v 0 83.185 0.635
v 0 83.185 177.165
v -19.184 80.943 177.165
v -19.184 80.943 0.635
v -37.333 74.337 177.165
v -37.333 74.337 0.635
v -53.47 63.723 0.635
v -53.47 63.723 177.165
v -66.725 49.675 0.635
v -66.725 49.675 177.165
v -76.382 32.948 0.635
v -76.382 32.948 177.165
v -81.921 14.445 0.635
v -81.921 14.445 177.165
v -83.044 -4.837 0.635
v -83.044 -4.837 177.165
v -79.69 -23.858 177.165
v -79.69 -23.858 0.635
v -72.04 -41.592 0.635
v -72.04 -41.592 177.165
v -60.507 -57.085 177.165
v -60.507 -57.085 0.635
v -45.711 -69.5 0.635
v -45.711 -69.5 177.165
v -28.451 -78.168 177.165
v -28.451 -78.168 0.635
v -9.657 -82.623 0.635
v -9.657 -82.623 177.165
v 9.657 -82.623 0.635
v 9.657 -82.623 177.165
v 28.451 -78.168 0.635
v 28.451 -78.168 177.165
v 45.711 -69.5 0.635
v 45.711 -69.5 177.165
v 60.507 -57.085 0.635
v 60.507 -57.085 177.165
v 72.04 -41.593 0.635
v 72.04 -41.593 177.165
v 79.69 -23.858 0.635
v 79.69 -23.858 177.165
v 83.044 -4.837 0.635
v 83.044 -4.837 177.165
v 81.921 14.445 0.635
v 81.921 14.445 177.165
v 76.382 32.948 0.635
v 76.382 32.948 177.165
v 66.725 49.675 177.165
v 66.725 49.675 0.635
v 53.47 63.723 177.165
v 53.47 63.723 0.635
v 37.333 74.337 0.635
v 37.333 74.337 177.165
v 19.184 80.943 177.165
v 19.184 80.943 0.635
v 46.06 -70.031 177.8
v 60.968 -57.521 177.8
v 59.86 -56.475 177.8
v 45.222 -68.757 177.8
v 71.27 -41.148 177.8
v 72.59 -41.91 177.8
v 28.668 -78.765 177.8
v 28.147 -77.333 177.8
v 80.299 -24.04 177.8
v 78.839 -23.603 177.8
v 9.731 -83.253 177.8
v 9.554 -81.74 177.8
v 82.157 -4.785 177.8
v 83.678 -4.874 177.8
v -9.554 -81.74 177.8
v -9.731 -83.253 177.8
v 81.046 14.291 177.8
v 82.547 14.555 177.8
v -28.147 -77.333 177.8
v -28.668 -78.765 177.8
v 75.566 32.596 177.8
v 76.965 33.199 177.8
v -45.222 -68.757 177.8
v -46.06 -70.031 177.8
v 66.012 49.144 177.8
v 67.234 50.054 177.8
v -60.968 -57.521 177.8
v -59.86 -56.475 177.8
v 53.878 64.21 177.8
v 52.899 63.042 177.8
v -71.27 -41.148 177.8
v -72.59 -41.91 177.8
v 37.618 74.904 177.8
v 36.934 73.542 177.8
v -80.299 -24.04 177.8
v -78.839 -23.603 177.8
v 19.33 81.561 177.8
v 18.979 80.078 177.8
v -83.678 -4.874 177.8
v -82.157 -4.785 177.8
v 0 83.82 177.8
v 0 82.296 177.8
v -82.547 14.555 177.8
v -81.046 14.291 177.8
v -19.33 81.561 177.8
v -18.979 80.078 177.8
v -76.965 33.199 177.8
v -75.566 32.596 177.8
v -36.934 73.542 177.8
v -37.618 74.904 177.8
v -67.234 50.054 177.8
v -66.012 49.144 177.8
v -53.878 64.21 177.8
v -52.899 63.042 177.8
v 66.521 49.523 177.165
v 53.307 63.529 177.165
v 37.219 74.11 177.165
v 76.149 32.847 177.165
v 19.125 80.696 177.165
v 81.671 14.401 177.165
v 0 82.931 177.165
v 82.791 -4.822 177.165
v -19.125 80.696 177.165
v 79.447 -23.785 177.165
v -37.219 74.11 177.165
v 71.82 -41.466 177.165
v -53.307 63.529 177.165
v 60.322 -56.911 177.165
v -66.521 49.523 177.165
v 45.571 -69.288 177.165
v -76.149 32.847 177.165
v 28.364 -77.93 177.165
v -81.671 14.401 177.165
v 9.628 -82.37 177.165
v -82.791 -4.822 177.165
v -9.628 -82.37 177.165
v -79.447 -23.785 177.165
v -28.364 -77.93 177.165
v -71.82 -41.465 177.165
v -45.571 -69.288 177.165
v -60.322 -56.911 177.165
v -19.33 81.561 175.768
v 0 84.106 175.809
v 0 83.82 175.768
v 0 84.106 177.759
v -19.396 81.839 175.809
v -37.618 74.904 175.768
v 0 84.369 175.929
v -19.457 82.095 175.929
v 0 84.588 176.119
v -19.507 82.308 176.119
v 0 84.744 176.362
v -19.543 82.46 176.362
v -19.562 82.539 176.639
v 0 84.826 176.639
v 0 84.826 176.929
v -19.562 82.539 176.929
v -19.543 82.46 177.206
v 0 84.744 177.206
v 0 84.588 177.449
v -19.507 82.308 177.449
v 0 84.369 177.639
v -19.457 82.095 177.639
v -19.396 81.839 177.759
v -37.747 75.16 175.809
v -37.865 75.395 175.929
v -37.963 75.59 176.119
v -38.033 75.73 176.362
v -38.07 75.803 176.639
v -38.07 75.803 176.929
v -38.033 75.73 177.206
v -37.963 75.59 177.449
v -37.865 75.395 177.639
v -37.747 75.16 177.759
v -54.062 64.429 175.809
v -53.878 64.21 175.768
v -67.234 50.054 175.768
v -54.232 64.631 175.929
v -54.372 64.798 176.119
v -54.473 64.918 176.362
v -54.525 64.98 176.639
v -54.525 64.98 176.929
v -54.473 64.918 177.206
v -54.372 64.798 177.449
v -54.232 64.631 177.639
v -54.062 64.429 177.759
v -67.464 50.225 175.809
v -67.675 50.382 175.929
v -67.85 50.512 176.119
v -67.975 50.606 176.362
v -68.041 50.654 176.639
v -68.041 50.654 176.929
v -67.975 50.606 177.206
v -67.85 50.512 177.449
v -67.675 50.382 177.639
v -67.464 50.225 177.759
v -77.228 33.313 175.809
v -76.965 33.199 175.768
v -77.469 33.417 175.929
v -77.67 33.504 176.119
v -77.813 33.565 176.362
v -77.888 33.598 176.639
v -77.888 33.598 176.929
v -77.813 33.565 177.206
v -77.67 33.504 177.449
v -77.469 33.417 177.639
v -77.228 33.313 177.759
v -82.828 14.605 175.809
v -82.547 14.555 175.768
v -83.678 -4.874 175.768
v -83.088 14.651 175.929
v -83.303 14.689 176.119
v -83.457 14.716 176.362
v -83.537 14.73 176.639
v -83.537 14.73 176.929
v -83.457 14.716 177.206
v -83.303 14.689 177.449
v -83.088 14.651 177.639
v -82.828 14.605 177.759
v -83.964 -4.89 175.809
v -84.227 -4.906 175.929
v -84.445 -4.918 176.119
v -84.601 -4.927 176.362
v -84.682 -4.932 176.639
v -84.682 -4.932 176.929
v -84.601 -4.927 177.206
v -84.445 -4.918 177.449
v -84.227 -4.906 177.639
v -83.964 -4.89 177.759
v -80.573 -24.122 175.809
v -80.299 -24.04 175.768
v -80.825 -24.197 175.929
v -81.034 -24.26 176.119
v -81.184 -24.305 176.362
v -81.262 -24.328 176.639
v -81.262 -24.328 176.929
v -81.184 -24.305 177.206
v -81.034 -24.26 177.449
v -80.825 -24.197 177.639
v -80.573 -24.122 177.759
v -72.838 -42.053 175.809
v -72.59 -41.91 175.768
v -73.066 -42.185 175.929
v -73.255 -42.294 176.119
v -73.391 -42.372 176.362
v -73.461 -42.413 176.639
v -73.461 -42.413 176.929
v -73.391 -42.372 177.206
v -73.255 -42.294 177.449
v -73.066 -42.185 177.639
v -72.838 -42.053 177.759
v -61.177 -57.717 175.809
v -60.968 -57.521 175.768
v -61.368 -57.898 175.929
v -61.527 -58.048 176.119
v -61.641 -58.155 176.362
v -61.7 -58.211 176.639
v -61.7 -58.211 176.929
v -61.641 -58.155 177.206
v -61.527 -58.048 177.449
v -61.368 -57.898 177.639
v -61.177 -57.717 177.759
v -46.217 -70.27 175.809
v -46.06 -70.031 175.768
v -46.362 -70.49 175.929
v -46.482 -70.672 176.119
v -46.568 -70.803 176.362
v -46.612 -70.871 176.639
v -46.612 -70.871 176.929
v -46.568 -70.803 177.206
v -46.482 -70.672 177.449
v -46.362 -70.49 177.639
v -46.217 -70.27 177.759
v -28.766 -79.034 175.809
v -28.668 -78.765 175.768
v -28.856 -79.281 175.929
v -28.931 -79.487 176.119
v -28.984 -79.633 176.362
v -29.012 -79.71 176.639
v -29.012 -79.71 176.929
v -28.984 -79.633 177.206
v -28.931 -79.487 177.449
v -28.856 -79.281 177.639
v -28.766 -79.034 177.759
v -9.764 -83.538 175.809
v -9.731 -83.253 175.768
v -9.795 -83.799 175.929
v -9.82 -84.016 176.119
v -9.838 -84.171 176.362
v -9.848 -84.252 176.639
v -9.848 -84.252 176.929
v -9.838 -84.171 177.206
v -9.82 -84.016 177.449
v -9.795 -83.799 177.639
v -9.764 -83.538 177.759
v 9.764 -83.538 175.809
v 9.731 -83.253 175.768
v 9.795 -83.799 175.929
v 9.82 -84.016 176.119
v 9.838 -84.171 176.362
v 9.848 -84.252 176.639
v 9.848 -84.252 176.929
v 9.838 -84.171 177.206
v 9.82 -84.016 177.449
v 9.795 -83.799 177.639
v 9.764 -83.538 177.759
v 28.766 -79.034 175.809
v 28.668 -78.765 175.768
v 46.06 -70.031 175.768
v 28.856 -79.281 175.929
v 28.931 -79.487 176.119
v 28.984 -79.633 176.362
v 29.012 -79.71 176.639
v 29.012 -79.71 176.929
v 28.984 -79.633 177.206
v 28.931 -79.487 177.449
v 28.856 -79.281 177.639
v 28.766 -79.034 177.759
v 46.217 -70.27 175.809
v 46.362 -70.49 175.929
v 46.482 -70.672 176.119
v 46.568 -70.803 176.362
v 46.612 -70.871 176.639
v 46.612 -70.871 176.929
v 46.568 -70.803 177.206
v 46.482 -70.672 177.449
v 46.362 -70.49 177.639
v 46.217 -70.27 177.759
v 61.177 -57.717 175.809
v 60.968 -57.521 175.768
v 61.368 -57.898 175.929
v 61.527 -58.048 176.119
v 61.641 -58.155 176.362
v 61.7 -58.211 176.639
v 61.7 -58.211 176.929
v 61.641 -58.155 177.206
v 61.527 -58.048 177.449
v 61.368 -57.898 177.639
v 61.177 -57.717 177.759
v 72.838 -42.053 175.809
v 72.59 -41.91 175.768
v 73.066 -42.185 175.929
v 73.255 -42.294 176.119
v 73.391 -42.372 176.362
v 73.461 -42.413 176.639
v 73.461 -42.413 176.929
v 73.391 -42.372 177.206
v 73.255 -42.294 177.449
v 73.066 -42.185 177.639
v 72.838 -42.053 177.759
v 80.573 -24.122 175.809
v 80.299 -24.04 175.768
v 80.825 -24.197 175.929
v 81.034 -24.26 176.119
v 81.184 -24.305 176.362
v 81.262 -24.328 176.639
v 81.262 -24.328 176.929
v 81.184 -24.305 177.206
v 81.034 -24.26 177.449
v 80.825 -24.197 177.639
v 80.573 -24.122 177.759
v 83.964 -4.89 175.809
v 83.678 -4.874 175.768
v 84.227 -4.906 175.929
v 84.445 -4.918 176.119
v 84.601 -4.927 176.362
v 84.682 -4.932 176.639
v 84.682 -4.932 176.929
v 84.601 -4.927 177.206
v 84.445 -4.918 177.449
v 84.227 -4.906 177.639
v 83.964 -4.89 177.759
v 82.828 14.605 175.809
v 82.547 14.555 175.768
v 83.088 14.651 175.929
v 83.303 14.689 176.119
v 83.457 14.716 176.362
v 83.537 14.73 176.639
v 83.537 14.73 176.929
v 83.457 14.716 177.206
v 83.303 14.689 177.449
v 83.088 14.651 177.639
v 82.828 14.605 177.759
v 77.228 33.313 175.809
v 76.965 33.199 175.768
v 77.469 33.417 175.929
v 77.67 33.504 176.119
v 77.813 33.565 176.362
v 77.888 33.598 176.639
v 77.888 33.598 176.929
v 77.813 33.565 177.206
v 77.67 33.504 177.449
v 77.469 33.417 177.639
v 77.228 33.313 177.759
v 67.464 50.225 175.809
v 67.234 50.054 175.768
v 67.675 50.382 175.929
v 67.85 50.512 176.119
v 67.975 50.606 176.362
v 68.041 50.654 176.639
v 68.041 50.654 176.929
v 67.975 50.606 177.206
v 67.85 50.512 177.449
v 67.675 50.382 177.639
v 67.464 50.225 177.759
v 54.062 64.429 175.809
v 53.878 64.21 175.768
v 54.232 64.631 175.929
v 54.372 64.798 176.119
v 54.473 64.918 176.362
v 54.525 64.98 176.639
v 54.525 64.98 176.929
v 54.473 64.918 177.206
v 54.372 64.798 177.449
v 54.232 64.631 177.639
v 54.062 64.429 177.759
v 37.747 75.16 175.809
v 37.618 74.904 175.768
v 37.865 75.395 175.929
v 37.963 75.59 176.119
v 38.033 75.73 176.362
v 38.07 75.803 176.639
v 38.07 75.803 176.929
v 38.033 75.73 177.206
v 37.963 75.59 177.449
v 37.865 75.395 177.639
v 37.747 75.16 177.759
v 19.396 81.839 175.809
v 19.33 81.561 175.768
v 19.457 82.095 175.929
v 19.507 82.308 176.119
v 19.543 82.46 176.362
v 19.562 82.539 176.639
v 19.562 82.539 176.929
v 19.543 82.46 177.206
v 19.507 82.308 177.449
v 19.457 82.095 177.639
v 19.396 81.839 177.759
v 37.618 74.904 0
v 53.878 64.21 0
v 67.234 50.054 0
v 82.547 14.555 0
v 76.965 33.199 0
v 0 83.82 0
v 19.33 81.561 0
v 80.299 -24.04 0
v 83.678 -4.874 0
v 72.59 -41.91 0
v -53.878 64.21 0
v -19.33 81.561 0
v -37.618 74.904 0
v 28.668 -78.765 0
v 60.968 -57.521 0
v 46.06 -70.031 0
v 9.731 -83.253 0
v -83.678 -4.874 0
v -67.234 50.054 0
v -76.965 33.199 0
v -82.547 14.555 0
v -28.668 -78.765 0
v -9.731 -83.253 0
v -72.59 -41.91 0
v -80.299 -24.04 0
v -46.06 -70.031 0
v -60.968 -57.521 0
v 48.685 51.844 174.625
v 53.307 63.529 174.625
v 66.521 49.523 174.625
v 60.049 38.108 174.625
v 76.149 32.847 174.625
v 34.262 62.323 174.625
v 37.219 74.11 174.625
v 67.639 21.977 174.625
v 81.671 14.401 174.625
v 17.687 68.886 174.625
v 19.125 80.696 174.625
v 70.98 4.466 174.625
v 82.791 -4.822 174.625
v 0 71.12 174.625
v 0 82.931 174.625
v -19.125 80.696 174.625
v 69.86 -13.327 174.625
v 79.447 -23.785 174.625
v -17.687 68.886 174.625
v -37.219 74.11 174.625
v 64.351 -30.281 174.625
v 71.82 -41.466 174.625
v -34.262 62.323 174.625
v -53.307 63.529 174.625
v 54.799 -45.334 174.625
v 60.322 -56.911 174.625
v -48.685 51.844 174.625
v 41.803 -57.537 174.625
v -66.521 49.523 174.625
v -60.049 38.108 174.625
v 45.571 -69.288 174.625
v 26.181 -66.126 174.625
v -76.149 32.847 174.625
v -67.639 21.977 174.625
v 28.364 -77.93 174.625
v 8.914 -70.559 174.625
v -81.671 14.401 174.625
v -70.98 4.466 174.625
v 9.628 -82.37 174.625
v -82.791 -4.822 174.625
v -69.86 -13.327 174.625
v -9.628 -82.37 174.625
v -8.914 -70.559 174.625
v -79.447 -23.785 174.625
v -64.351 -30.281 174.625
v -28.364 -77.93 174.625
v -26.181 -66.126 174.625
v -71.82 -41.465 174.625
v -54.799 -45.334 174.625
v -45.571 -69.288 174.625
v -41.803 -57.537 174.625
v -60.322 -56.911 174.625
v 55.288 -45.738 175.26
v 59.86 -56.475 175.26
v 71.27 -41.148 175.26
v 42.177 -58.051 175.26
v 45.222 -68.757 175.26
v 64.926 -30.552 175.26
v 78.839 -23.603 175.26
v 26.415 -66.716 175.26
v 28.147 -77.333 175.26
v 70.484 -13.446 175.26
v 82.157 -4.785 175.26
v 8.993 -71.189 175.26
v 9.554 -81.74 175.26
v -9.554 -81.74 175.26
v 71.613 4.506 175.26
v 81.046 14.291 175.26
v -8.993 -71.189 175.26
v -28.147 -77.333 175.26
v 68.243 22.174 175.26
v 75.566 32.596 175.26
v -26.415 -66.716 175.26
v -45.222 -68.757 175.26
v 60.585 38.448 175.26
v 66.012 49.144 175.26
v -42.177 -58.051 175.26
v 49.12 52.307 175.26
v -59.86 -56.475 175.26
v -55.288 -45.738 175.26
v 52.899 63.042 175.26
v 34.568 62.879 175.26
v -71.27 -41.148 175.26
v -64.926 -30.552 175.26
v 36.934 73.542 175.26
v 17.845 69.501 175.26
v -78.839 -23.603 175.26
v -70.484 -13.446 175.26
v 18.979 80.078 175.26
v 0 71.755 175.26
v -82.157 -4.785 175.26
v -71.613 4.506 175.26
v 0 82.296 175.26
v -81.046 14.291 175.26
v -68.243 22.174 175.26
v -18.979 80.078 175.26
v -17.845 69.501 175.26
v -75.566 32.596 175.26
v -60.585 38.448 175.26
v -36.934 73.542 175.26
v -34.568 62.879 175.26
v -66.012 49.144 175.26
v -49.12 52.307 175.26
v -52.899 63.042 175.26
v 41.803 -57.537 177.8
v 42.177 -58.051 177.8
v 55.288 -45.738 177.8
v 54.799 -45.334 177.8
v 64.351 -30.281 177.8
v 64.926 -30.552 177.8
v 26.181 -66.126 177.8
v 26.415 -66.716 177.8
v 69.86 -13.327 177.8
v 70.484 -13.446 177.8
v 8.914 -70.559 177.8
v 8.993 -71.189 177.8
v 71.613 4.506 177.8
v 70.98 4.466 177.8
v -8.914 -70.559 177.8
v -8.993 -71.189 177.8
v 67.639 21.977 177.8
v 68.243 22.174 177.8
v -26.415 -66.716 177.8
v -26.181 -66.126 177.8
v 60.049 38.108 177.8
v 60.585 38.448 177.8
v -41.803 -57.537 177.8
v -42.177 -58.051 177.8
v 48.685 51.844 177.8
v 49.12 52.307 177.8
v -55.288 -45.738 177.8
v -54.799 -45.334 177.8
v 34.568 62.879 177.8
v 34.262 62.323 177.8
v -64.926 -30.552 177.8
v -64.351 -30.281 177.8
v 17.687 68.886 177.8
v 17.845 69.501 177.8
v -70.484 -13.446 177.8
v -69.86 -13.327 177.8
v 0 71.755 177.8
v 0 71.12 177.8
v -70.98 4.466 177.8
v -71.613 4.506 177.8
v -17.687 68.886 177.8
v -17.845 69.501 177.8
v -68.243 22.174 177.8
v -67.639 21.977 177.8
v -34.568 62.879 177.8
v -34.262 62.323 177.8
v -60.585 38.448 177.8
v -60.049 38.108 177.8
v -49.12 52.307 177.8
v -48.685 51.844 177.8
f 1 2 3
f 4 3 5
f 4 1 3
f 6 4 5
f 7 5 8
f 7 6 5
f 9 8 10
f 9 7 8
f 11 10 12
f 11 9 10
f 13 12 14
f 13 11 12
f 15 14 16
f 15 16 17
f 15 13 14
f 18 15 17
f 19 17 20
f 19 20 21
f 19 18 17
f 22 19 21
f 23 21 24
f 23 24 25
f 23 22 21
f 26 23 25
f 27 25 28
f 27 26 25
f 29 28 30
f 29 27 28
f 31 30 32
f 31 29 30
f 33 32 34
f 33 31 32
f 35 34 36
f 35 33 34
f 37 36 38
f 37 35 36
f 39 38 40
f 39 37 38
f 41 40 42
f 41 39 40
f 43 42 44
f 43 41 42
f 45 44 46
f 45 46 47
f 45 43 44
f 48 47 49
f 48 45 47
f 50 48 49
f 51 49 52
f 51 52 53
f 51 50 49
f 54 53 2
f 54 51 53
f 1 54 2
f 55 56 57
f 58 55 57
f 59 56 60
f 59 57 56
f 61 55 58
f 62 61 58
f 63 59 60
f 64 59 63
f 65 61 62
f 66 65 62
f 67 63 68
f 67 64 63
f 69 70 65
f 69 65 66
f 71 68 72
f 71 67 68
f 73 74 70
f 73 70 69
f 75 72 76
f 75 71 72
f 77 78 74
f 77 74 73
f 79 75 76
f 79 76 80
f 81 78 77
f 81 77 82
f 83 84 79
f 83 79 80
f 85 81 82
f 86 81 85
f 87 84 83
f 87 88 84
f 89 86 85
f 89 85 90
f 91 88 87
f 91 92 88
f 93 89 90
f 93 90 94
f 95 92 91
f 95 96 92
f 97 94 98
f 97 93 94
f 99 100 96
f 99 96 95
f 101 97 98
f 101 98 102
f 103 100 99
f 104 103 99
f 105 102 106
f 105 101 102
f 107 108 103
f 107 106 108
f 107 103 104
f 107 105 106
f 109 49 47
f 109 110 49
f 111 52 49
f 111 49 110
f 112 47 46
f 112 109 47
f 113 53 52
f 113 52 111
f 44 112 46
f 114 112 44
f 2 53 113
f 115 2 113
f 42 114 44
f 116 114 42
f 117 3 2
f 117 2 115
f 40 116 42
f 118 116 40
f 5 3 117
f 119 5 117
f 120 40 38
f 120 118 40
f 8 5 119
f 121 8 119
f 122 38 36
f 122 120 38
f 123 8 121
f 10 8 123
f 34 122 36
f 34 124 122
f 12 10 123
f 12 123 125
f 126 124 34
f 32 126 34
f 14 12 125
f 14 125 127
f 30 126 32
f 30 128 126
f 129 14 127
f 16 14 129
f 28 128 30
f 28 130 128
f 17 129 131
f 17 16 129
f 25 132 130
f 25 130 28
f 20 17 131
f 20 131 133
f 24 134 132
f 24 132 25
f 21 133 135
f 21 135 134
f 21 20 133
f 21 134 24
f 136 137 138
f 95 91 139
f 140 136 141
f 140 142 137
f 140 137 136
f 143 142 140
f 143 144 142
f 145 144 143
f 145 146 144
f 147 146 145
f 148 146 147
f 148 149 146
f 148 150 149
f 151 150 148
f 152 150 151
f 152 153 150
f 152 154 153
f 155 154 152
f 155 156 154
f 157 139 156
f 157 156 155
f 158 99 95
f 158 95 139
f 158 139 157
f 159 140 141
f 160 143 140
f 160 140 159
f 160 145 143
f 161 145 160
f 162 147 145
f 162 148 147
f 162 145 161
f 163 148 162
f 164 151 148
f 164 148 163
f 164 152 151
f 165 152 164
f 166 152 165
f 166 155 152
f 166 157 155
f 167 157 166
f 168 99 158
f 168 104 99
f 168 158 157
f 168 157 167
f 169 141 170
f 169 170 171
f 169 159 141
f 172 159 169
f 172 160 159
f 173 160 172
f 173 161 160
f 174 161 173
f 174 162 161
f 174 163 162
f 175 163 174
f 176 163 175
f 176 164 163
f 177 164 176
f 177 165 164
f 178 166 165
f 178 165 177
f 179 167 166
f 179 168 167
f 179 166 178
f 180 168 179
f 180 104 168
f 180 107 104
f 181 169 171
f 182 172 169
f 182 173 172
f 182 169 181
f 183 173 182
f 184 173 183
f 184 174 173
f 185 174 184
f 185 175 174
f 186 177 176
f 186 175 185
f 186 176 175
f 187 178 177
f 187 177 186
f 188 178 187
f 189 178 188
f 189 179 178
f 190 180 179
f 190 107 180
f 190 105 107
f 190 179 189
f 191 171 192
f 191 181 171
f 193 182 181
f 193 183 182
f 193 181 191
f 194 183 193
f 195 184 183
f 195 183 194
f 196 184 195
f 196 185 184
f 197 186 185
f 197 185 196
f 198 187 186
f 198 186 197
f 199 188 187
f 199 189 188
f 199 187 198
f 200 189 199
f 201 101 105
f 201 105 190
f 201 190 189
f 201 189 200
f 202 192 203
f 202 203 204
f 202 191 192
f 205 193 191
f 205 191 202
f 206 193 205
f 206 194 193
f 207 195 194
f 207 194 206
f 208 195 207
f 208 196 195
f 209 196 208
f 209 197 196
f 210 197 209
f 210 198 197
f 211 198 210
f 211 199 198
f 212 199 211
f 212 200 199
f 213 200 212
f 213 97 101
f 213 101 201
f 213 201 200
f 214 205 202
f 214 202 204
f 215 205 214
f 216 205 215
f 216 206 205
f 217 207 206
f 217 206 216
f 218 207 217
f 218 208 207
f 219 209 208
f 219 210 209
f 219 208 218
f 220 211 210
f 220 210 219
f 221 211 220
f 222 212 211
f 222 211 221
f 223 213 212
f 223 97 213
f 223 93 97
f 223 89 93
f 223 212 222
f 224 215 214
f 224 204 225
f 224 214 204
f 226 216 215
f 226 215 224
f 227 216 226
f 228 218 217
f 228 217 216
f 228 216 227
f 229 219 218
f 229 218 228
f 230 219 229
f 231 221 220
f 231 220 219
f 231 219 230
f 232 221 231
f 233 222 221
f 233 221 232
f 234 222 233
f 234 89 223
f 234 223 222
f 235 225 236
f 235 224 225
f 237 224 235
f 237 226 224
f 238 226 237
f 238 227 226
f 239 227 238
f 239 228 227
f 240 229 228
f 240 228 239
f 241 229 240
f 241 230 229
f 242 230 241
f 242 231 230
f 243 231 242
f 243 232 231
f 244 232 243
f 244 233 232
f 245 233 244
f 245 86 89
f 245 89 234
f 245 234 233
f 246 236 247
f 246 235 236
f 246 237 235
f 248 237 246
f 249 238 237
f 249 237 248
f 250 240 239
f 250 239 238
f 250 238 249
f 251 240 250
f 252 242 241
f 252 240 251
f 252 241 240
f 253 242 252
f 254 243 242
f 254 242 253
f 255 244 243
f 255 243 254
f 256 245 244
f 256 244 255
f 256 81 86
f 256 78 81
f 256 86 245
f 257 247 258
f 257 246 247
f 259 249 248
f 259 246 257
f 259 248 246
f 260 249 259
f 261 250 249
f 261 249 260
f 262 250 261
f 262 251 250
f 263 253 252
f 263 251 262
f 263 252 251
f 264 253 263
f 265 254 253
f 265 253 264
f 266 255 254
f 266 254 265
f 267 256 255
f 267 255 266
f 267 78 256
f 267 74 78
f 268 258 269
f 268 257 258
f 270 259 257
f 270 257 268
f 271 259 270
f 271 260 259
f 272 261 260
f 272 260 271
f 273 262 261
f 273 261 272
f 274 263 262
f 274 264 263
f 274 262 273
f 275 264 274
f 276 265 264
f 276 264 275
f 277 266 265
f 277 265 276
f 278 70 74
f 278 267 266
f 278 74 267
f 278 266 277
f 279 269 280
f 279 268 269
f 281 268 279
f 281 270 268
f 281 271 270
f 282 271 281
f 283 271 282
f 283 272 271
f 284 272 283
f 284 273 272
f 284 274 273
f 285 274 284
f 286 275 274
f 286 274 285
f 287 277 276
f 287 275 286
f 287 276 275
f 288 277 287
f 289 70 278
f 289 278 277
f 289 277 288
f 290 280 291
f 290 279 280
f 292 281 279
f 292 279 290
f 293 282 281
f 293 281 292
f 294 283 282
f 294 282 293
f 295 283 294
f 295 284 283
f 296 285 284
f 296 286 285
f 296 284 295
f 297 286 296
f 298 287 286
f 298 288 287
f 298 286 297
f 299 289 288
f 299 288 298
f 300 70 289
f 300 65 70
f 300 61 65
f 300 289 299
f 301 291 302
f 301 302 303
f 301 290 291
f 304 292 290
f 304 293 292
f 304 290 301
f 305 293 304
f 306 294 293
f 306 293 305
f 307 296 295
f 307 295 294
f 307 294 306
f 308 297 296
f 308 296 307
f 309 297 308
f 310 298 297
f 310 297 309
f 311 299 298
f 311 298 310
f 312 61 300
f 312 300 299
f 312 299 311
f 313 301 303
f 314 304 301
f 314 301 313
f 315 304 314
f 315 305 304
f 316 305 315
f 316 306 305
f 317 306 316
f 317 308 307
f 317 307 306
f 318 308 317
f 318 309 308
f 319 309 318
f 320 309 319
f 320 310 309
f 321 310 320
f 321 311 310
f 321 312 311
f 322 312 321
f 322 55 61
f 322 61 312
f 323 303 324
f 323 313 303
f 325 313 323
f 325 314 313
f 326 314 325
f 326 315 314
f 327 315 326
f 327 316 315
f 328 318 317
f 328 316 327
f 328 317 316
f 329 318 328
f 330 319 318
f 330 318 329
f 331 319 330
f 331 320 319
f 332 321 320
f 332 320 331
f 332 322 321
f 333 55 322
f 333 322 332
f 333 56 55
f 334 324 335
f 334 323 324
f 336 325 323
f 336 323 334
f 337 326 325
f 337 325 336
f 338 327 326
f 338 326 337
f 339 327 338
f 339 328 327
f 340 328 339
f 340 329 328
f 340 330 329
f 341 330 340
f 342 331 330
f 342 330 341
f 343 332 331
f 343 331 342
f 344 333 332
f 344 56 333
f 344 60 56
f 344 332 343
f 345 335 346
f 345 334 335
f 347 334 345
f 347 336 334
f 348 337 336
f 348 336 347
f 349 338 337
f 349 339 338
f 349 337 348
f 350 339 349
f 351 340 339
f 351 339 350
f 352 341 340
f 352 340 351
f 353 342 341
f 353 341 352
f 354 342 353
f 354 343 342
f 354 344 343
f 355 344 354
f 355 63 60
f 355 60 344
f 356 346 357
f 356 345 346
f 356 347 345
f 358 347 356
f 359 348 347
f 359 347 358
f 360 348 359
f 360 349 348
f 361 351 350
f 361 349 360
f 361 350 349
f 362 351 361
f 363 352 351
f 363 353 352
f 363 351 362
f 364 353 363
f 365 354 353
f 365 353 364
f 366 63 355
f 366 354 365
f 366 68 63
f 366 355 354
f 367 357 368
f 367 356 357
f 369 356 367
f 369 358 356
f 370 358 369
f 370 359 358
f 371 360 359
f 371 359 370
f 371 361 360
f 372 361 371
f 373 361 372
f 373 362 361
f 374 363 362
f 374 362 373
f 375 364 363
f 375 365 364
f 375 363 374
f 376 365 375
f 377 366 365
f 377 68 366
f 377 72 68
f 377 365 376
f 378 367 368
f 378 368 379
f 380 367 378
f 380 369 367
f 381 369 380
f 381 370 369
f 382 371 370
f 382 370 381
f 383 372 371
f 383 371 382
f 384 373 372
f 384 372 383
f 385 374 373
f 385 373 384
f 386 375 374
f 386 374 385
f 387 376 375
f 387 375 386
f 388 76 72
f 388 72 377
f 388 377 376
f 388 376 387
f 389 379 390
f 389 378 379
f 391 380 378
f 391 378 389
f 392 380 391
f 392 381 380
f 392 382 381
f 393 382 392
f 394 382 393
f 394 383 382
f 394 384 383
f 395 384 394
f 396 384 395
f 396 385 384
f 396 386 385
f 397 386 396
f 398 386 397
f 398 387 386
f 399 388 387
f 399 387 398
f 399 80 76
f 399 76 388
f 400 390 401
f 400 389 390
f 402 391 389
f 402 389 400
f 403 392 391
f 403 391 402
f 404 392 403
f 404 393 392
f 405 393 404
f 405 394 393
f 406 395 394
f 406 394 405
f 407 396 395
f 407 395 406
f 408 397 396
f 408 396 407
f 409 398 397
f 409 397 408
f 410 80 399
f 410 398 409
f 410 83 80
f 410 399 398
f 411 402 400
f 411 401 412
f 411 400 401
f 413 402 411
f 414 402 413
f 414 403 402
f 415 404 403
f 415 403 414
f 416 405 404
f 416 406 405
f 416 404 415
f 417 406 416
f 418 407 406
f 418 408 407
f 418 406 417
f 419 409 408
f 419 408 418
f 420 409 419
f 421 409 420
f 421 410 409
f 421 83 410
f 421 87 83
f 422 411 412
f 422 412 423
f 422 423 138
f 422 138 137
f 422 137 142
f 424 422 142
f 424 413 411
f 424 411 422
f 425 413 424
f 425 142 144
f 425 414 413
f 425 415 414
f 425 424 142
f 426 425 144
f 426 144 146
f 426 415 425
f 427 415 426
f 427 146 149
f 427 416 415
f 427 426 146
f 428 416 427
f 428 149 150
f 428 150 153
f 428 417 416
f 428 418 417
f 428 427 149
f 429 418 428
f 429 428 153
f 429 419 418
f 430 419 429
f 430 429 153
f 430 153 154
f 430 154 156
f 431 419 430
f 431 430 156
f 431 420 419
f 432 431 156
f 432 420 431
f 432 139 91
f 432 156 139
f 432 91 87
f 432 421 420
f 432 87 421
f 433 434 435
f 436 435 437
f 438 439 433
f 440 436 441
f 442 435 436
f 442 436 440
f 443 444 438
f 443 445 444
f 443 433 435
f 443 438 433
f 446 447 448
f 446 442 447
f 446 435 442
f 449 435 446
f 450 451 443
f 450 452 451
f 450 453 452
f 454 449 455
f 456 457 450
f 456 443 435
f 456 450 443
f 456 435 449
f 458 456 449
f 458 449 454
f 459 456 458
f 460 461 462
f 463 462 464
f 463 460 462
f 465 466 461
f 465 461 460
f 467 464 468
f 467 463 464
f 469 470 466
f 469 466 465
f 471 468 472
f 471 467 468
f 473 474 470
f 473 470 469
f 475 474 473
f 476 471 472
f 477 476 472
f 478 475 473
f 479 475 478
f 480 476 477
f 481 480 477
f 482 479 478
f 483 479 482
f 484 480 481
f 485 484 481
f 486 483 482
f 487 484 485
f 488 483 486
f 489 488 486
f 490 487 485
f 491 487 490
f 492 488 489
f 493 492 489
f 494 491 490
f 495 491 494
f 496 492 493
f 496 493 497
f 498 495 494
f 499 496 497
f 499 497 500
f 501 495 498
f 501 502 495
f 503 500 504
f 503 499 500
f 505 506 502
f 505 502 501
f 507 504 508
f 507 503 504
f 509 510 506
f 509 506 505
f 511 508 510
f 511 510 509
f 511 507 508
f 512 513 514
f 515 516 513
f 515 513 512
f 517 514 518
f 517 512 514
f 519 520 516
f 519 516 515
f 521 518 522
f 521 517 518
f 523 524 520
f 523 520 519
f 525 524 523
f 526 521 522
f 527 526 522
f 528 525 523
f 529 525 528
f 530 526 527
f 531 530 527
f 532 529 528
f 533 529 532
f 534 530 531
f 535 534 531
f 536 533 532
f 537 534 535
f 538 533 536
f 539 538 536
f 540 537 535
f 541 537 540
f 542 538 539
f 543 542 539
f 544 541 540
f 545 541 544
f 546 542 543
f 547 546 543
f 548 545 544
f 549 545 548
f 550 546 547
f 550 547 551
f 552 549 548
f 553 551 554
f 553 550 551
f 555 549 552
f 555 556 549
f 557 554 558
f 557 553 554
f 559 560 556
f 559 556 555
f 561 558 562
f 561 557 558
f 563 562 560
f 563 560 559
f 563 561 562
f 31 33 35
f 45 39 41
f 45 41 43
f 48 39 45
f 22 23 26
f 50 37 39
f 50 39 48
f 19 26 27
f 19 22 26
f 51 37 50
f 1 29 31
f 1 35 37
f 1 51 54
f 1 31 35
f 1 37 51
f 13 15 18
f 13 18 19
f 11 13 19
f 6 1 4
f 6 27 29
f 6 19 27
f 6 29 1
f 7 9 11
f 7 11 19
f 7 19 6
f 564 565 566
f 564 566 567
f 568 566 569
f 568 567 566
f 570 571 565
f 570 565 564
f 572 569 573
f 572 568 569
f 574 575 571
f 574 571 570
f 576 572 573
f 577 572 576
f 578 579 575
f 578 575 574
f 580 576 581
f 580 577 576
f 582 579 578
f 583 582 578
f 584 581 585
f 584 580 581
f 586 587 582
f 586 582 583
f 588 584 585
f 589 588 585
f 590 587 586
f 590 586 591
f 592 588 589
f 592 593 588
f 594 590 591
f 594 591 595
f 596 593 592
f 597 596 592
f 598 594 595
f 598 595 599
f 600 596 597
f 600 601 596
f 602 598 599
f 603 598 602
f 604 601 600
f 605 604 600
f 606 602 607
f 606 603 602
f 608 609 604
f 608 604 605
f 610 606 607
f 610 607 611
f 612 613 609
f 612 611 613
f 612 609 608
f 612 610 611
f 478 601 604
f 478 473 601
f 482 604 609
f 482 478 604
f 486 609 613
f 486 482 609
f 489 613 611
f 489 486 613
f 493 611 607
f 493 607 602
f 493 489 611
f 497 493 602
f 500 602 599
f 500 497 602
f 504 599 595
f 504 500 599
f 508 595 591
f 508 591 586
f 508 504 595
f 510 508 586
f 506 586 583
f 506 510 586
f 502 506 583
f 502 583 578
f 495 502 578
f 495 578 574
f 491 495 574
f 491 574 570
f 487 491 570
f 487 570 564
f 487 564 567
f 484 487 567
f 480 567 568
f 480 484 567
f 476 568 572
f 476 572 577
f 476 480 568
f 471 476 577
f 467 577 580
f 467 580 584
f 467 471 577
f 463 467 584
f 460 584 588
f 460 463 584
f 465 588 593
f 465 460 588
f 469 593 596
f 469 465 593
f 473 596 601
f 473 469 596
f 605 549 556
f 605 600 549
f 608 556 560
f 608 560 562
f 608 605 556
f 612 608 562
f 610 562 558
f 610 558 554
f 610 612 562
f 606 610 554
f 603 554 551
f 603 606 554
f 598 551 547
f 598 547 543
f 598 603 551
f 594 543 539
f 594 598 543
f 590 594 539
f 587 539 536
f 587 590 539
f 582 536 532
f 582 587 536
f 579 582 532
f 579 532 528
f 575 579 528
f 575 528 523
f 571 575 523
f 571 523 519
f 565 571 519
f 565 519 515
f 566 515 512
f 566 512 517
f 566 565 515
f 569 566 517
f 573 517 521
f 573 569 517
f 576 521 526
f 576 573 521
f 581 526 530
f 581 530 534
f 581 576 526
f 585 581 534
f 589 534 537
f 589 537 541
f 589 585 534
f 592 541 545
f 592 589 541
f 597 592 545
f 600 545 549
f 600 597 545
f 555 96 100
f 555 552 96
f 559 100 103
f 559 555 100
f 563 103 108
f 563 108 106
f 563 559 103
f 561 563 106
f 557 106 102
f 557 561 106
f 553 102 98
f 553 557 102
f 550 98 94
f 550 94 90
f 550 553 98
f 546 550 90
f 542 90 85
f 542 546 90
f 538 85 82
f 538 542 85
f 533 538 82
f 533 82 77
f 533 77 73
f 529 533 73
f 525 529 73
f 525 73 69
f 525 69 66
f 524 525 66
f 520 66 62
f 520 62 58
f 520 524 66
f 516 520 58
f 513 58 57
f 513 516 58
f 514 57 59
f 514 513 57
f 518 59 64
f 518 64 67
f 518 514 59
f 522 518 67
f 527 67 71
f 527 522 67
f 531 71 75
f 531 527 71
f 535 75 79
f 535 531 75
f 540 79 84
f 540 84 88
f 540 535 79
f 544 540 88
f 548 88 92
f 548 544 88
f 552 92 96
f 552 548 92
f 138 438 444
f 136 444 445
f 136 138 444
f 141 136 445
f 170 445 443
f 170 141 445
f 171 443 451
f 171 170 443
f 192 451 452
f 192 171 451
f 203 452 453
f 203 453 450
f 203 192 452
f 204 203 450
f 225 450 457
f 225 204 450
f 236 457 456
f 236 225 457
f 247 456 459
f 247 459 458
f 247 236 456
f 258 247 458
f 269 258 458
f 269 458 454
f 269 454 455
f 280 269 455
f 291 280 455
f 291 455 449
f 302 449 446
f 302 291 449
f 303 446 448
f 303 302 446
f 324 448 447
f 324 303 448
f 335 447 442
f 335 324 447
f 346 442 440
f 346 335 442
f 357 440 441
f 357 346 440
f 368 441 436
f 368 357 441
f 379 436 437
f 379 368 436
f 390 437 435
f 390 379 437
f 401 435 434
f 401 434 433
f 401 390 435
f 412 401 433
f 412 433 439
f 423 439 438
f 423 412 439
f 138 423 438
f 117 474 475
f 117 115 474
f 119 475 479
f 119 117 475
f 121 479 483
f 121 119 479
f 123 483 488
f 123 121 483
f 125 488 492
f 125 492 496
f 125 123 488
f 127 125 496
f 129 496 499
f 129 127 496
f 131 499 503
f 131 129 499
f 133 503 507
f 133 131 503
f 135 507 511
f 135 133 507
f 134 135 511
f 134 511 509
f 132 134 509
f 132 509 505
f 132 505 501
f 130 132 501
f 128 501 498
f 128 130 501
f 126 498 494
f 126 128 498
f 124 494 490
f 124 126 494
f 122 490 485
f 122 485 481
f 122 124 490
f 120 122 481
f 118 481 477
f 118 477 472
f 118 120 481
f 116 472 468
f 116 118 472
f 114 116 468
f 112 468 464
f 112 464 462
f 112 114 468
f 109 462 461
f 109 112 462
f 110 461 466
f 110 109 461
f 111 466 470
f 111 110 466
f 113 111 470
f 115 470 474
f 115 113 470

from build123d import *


with BuildPart() as f1:
    # F0 (on Right) → F1 (revolve)
    with BuildSketch(Plane.YZ):
        with BuildLine():
            Line((0, 0.635), (0, 0))
            Line((0, 0), (83.82, 0))
            Line((83.82, 0), (83.82, 175.768))
            ThreePointArc((83.82, 175.768), (84.836, 176.784), (83.82, 177.8))
            Line((83.82, 177.8), (82.296, 177.8))
            Line((82.296, 177.8), (82.296, 175.26))
            Line((82.296, 175.26), (71.755, 175.26))
            Line((71.755, 175.26), (71.755, 177.8))
            Line((71.755, 177.8), (71.12, 177.8))
            Line((71.12, 177.8), (71.12, 174.625))
            Line((71.12, 174.625), (82.931, 174.625))
            Line((82.931, 174.625), (82.931, 177.165))
            Line((82.931, 177.165), (83.185, 177.165))
            Line((83.185, 177.165), (83.185, 0.635))
            Line((83.185, 0.635), (0, 0.635))
        make_face()
    revolve(axis=Axis((0, 0, 48.229507), (0, 0, 1)))


solid = f1.part
